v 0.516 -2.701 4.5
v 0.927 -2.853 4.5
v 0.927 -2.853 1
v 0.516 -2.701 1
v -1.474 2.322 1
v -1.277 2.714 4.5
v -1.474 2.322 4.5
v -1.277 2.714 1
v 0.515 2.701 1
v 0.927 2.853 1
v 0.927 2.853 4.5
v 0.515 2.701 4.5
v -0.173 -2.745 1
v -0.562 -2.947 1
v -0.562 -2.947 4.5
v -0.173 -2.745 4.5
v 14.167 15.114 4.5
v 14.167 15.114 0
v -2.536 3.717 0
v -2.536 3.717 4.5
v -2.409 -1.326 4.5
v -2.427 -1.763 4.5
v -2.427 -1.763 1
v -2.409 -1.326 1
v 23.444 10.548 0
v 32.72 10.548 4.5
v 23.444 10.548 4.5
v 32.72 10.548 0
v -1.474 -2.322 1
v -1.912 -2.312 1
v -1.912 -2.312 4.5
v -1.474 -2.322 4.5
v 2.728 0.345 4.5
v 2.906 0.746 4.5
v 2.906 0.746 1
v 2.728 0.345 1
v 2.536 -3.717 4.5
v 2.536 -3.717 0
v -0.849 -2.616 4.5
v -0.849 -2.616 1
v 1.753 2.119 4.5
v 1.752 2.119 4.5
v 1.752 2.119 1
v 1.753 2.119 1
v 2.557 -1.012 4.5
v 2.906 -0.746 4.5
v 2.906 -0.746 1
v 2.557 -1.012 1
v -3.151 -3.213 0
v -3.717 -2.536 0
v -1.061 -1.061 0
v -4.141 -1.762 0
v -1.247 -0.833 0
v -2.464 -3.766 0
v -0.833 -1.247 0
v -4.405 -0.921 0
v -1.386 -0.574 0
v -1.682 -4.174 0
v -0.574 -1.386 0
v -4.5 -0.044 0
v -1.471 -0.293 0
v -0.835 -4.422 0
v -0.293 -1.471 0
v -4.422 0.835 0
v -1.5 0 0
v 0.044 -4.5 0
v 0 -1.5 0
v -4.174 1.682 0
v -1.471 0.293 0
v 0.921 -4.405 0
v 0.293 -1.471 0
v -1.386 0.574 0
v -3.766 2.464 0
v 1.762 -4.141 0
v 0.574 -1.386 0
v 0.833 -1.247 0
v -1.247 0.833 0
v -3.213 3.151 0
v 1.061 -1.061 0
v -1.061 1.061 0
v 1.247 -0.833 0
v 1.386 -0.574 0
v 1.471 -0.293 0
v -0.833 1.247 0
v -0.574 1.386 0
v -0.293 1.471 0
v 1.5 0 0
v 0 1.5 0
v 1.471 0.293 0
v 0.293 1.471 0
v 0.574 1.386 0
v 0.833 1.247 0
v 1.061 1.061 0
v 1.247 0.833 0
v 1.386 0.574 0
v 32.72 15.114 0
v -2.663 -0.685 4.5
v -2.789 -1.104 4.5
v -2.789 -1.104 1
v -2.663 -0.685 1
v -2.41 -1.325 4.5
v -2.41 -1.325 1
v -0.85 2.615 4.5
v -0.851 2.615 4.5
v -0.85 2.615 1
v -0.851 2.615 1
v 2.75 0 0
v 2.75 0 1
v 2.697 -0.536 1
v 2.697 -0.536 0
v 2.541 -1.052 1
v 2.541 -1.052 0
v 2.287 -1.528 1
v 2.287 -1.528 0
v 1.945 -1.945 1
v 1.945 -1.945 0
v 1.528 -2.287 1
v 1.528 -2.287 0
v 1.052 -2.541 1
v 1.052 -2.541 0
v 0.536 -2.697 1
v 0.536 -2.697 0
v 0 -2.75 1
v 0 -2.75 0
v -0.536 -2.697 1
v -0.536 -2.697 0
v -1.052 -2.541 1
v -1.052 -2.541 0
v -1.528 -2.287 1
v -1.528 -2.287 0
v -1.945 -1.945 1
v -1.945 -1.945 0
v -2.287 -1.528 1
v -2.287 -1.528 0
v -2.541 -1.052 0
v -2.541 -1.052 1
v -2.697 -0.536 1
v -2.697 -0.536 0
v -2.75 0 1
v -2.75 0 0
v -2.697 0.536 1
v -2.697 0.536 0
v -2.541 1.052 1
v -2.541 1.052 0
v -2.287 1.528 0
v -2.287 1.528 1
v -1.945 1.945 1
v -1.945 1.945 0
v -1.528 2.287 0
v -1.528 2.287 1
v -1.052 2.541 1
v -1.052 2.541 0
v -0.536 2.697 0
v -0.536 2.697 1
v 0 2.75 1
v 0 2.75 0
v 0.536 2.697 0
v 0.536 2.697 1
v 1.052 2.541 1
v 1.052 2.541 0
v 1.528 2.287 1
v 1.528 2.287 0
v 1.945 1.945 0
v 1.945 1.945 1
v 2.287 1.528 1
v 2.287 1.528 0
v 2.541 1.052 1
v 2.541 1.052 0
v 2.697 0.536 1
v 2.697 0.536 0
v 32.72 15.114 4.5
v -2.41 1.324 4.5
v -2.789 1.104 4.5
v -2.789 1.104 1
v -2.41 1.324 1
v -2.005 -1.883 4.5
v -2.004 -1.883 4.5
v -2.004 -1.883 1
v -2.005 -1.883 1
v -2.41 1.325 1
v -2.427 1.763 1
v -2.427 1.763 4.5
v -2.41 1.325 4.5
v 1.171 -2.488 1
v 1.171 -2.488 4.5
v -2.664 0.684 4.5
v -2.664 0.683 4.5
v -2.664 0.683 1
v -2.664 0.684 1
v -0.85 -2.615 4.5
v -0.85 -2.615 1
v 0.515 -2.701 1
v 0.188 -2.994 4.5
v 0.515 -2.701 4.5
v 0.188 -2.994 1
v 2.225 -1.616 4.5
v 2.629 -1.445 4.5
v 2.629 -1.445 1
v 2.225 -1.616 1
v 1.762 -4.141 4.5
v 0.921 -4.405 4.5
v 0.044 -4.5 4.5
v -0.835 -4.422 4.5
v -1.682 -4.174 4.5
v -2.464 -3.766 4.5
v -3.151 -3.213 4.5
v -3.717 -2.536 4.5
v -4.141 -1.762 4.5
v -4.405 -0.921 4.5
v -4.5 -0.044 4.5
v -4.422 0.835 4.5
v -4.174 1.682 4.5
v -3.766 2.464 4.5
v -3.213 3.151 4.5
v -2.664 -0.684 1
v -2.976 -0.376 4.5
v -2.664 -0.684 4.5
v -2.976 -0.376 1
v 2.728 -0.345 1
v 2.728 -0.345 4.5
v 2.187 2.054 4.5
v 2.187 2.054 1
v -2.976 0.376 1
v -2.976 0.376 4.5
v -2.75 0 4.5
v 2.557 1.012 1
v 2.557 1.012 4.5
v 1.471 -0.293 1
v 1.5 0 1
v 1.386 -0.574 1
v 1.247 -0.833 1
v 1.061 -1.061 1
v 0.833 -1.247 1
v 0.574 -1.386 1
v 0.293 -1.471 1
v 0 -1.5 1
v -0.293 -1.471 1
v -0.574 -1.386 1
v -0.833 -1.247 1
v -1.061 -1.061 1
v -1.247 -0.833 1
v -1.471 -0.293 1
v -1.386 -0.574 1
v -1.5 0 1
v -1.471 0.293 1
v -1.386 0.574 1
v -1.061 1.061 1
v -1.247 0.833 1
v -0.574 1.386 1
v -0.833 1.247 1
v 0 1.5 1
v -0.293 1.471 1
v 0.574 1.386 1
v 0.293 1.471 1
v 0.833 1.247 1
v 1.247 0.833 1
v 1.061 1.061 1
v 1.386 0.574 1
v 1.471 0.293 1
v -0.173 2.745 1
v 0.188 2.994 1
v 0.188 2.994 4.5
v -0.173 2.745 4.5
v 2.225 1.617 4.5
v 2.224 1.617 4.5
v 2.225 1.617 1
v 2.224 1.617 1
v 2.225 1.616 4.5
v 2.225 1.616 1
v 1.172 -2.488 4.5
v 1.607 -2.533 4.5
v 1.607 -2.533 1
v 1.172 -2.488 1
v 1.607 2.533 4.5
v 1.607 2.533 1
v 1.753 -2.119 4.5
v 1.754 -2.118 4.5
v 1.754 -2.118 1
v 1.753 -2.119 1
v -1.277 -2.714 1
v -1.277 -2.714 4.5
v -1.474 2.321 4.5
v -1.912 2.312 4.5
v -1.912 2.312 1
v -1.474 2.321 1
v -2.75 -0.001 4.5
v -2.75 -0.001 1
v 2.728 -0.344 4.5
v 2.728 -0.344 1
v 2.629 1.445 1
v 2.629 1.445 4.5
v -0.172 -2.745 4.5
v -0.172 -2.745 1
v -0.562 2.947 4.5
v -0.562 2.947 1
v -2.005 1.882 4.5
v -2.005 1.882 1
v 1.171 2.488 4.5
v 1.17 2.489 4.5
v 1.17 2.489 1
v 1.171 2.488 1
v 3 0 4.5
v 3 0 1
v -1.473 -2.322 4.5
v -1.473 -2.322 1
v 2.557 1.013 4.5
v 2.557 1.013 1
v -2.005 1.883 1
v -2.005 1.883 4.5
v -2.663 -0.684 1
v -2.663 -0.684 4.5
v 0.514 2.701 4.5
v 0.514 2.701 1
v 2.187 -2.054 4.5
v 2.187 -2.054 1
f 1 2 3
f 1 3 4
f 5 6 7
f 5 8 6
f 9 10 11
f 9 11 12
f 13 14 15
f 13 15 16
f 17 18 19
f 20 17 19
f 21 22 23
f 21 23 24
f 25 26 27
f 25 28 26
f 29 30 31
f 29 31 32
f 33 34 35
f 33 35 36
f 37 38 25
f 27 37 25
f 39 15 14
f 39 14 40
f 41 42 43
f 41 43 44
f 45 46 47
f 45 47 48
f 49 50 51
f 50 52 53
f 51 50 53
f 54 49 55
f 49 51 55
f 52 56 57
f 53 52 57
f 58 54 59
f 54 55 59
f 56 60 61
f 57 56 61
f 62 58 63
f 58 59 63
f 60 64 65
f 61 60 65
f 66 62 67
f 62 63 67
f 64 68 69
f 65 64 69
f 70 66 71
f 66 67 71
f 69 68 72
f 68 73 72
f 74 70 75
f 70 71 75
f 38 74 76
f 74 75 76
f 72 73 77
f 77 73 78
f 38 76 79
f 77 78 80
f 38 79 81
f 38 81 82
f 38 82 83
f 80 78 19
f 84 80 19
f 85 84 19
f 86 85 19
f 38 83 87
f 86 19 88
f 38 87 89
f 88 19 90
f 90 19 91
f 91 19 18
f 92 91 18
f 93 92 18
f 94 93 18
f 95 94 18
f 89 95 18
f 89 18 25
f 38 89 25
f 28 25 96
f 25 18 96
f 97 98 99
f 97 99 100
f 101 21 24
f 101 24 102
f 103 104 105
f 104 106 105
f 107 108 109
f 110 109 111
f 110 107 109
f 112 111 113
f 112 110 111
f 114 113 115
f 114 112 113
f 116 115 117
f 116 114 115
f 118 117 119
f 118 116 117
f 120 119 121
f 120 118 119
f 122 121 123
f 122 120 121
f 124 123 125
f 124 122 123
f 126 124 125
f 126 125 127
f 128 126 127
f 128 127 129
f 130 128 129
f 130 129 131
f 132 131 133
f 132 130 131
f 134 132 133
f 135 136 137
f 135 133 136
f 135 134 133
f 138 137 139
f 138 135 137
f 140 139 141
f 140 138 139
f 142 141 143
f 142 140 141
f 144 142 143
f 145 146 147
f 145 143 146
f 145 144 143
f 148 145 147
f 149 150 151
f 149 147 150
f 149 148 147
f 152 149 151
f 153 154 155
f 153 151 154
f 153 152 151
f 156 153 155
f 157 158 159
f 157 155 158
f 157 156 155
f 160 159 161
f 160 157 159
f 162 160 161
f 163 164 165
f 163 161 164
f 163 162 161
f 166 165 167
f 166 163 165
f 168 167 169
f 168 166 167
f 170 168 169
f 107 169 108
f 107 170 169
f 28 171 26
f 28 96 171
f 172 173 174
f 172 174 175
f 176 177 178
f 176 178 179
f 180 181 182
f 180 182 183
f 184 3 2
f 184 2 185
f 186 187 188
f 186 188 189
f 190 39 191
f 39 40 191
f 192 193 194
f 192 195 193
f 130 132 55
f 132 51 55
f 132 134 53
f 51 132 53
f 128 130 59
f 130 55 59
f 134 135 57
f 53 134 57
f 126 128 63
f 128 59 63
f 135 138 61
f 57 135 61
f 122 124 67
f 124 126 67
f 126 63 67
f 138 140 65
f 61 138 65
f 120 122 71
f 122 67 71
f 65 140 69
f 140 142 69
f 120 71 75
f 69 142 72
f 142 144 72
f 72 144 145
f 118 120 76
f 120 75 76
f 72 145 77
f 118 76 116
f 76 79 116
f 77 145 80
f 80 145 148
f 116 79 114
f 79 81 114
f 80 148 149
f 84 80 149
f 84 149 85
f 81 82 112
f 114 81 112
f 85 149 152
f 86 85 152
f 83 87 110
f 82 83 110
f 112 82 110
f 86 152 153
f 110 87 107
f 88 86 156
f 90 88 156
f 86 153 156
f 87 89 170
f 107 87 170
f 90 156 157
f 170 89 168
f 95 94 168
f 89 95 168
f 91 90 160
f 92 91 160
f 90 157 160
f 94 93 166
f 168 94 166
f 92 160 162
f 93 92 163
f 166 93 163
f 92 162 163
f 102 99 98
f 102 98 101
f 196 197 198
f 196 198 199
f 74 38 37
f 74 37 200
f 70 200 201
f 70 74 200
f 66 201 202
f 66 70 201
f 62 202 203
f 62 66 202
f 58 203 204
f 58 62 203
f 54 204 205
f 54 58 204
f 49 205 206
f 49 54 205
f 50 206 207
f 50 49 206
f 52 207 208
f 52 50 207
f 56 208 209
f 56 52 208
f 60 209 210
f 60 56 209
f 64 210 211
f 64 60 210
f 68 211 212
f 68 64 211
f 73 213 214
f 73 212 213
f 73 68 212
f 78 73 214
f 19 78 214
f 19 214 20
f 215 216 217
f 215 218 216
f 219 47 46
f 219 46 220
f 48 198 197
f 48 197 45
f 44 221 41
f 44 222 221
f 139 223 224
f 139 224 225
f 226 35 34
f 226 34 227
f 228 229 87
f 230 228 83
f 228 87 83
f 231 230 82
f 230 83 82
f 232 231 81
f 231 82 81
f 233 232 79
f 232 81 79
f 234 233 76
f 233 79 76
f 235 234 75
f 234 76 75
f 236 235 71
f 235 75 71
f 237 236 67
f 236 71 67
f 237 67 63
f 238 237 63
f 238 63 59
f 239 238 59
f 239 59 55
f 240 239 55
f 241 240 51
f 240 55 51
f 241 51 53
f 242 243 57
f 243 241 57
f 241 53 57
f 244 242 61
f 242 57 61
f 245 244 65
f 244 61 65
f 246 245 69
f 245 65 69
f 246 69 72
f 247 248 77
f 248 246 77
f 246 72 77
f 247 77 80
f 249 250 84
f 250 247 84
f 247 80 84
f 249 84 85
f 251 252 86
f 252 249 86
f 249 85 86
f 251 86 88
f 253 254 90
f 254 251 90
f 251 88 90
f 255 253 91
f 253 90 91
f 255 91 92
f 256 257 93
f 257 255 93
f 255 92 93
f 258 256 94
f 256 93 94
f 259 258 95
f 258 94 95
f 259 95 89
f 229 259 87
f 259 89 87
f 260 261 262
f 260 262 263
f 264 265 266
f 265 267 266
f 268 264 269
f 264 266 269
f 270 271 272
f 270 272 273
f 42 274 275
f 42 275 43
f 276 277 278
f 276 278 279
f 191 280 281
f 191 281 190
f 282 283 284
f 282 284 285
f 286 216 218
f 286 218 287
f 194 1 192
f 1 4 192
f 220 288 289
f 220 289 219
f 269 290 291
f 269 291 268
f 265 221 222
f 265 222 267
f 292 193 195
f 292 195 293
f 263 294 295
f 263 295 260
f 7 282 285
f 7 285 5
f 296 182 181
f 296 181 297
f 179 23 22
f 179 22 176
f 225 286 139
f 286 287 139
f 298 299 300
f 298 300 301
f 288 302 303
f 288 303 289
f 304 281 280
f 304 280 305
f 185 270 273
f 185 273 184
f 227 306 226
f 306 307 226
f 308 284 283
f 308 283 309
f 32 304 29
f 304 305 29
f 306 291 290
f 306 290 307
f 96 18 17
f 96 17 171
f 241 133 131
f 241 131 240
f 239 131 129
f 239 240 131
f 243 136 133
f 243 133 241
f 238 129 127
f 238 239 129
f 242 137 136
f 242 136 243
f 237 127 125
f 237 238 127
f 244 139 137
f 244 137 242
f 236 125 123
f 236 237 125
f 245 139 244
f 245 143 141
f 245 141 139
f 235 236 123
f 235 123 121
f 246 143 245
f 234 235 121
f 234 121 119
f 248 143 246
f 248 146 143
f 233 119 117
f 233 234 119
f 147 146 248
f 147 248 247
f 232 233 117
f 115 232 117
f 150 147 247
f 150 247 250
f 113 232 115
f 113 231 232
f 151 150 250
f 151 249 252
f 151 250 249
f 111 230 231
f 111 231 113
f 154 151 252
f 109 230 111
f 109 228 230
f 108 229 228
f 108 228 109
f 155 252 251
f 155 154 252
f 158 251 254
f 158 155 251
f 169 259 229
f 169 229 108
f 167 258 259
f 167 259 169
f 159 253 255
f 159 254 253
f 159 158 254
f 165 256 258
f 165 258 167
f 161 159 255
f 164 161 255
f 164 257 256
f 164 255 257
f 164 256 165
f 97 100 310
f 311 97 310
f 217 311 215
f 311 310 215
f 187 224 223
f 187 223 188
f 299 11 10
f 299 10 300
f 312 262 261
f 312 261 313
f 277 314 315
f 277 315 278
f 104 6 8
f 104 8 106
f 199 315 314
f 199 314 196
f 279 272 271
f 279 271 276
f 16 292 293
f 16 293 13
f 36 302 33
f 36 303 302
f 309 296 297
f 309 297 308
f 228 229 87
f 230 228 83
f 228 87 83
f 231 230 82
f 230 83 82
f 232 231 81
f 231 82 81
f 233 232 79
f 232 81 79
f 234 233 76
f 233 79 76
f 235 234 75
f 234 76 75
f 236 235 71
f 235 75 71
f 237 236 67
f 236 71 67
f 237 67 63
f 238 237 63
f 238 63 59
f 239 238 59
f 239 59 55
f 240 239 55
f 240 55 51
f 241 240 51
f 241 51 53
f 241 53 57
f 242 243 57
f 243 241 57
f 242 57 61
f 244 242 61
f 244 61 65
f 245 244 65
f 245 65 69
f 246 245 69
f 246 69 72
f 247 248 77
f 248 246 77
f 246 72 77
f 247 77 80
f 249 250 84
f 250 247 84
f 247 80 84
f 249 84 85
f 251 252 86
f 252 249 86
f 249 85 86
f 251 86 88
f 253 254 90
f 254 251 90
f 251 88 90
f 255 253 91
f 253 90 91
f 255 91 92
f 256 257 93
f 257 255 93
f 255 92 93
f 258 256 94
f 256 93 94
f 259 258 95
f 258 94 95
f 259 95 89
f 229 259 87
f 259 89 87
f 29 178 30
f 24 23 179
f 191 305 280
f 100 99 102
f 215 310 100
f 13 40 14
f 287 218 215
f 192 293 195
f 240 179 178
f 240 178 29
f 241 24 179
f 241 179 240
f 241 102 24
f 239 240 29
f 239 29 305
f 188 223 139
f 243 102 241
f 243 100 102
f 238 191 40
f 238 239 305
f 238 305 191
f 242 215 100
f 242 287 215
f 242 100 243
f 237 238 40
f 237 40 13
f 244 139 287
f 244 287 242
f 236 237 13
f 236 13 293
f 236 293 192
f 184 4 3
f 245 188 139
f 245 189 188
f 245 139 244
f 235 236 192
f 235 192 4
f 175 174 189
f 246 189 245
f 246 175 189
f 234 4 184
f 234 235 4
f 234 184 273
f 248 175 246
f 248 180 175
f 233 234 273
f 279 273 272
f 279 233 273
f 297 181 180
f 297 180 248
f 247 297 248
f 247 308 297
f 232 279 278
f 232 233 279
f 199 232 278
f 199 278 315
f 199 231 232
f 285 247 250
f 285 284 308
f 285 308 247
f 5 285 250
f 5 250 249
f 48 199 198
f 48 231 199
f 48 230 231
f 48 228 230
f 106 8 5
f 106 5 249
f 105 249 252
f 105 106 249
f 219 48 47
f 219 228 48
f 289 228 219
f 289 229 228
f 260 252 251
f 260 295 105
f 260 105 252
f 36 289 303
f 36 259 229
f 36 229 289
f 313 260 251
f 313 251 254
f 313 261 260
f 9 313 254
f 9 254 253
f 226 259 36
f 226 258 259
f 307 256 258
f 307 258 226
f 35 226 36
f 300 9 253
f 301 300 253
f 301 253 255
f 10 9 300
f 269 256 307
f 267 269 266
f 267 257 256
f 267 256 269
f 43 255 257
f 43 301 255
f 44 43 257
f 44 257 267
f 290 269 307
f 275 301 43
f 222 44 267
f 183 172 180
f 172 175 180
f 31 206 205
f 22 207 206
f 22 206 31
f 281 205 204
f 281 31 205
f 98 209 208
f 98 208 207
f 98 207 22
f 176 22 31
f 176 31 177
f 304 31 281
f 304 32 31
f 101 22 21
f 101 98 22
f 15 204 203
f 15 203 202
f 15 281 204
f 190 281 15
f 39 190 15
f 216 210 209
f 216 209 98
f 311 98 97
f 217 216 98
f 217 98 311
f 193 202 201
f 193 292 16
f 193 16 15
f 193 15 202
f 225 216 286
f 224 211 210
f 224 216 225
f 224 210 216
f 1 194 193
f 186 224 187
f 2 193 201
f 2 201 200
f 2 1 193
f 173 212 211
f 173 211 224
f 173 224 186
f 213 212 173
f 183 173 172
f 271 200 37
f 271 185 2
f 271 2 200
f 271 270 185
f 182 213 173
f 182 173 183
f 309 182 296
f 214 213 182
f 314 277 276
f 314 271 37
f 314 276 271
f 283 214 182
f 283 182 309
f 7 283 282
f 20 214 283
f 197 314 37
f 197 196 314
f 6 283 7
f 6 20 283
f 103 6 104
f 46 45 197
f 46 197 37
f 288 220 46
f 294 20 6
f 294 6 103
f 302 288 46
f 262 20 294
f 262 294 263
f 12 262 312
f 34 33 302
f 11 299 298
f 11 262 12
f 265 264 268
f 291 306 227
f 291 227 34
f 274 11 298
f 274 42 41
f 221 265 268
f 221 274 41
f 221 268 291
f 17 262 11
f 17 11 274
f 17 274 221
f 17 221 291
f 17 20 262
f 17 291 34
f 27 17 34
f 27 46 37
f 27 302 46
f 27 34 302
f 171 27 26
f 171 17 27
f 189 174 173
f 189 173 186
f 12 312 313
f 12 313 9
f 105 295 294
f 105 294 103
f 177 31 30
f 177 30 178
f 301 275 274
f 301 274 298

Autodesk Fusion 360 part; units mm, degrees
sketch "Sketch1" plane through (0, 0, 0) normal (0, 0, 1) x (1, 0, 0)
  circle A0 centre (0, 0) radius 1.5
  circle A1 centre (0, 0) radius 2.75
  circle A2 centre (0, 0) radius 4.5
  circle A3 centre (0, 0) radius 3
  line L0 (0, 0) -> (-3, 0)
  line L1 (0, 0) -> (-2.9763, 0.376)
  line L2 (0, 0) -> (3, 0) construction
  line L3 (0, 0) -> (-2.906, 0.7452)
  line L4 (-2.9763, 0.376) -> (-2.6638, 0.6831)
  line L5 (-2.9763, 0.376) -> (-2.75, 0)
  line L6 (14.1674, 15.1142) -> (32.7197, 15.1142)
  line L7 (32.7197, 15.1142) -> (32.7197, 10.548)
  line L8 (32.7197, 10.548) -> (14.1674, 10.548)
  line L9 (14.1674, 10.548) -> (14.1674, 15.1142)
  line L10 (14.1674, 15.1142) -> (-2.5363, 3.7172)
  line L11 (2.5363, -3.7172) -> (23.4435, 10.548)
  dimension "d1" = 3
  dimension "d2" = 5.5
  dimension "d3" = 9
  dimension "d10" = 6
  dimension "d11" = 172.8
  dimension "d12" = 7.2
extrude "Extrude1" add sketch "Sketch1" along normal blind 1 contours A0 A1 L0 L3 | A0 A1 L1 L3 | A0 A1 L0 L1 makes body 1
extrude "Extrude2" add sketch "Sketch1" along normal blind 4.5 separate body contours A1 A3 L0 L3 | A3 L3 L4 | A1 L1 L4 | A1 L1 L5 | A3 L0 L5 | A2 makes body 2
extrude "Extrude3" add sketch "Sketch1" along normal blind 1 contours A0 A1 L0 L3 | A0 A1 L1 L3 | A0 A1 L0 L1 bodies 2
extrude "Extrude4" cut sketch "Sketch1" along normal blind 7 from surface at 1 contours A1 L1 L4 | A1 L1 L5 bodies 2
pattern_circular "C-Pattern1" count 25 over 360 about axis through (0, 0, 1.75) along (0, 0, 1) of "Extrude4"
extrude "Extrude5" add sketch "Sketch1" along normal blind 4.5 contours A2 L8 L9 L10 L11 | L6 L7 L8 L9 bodies 2
